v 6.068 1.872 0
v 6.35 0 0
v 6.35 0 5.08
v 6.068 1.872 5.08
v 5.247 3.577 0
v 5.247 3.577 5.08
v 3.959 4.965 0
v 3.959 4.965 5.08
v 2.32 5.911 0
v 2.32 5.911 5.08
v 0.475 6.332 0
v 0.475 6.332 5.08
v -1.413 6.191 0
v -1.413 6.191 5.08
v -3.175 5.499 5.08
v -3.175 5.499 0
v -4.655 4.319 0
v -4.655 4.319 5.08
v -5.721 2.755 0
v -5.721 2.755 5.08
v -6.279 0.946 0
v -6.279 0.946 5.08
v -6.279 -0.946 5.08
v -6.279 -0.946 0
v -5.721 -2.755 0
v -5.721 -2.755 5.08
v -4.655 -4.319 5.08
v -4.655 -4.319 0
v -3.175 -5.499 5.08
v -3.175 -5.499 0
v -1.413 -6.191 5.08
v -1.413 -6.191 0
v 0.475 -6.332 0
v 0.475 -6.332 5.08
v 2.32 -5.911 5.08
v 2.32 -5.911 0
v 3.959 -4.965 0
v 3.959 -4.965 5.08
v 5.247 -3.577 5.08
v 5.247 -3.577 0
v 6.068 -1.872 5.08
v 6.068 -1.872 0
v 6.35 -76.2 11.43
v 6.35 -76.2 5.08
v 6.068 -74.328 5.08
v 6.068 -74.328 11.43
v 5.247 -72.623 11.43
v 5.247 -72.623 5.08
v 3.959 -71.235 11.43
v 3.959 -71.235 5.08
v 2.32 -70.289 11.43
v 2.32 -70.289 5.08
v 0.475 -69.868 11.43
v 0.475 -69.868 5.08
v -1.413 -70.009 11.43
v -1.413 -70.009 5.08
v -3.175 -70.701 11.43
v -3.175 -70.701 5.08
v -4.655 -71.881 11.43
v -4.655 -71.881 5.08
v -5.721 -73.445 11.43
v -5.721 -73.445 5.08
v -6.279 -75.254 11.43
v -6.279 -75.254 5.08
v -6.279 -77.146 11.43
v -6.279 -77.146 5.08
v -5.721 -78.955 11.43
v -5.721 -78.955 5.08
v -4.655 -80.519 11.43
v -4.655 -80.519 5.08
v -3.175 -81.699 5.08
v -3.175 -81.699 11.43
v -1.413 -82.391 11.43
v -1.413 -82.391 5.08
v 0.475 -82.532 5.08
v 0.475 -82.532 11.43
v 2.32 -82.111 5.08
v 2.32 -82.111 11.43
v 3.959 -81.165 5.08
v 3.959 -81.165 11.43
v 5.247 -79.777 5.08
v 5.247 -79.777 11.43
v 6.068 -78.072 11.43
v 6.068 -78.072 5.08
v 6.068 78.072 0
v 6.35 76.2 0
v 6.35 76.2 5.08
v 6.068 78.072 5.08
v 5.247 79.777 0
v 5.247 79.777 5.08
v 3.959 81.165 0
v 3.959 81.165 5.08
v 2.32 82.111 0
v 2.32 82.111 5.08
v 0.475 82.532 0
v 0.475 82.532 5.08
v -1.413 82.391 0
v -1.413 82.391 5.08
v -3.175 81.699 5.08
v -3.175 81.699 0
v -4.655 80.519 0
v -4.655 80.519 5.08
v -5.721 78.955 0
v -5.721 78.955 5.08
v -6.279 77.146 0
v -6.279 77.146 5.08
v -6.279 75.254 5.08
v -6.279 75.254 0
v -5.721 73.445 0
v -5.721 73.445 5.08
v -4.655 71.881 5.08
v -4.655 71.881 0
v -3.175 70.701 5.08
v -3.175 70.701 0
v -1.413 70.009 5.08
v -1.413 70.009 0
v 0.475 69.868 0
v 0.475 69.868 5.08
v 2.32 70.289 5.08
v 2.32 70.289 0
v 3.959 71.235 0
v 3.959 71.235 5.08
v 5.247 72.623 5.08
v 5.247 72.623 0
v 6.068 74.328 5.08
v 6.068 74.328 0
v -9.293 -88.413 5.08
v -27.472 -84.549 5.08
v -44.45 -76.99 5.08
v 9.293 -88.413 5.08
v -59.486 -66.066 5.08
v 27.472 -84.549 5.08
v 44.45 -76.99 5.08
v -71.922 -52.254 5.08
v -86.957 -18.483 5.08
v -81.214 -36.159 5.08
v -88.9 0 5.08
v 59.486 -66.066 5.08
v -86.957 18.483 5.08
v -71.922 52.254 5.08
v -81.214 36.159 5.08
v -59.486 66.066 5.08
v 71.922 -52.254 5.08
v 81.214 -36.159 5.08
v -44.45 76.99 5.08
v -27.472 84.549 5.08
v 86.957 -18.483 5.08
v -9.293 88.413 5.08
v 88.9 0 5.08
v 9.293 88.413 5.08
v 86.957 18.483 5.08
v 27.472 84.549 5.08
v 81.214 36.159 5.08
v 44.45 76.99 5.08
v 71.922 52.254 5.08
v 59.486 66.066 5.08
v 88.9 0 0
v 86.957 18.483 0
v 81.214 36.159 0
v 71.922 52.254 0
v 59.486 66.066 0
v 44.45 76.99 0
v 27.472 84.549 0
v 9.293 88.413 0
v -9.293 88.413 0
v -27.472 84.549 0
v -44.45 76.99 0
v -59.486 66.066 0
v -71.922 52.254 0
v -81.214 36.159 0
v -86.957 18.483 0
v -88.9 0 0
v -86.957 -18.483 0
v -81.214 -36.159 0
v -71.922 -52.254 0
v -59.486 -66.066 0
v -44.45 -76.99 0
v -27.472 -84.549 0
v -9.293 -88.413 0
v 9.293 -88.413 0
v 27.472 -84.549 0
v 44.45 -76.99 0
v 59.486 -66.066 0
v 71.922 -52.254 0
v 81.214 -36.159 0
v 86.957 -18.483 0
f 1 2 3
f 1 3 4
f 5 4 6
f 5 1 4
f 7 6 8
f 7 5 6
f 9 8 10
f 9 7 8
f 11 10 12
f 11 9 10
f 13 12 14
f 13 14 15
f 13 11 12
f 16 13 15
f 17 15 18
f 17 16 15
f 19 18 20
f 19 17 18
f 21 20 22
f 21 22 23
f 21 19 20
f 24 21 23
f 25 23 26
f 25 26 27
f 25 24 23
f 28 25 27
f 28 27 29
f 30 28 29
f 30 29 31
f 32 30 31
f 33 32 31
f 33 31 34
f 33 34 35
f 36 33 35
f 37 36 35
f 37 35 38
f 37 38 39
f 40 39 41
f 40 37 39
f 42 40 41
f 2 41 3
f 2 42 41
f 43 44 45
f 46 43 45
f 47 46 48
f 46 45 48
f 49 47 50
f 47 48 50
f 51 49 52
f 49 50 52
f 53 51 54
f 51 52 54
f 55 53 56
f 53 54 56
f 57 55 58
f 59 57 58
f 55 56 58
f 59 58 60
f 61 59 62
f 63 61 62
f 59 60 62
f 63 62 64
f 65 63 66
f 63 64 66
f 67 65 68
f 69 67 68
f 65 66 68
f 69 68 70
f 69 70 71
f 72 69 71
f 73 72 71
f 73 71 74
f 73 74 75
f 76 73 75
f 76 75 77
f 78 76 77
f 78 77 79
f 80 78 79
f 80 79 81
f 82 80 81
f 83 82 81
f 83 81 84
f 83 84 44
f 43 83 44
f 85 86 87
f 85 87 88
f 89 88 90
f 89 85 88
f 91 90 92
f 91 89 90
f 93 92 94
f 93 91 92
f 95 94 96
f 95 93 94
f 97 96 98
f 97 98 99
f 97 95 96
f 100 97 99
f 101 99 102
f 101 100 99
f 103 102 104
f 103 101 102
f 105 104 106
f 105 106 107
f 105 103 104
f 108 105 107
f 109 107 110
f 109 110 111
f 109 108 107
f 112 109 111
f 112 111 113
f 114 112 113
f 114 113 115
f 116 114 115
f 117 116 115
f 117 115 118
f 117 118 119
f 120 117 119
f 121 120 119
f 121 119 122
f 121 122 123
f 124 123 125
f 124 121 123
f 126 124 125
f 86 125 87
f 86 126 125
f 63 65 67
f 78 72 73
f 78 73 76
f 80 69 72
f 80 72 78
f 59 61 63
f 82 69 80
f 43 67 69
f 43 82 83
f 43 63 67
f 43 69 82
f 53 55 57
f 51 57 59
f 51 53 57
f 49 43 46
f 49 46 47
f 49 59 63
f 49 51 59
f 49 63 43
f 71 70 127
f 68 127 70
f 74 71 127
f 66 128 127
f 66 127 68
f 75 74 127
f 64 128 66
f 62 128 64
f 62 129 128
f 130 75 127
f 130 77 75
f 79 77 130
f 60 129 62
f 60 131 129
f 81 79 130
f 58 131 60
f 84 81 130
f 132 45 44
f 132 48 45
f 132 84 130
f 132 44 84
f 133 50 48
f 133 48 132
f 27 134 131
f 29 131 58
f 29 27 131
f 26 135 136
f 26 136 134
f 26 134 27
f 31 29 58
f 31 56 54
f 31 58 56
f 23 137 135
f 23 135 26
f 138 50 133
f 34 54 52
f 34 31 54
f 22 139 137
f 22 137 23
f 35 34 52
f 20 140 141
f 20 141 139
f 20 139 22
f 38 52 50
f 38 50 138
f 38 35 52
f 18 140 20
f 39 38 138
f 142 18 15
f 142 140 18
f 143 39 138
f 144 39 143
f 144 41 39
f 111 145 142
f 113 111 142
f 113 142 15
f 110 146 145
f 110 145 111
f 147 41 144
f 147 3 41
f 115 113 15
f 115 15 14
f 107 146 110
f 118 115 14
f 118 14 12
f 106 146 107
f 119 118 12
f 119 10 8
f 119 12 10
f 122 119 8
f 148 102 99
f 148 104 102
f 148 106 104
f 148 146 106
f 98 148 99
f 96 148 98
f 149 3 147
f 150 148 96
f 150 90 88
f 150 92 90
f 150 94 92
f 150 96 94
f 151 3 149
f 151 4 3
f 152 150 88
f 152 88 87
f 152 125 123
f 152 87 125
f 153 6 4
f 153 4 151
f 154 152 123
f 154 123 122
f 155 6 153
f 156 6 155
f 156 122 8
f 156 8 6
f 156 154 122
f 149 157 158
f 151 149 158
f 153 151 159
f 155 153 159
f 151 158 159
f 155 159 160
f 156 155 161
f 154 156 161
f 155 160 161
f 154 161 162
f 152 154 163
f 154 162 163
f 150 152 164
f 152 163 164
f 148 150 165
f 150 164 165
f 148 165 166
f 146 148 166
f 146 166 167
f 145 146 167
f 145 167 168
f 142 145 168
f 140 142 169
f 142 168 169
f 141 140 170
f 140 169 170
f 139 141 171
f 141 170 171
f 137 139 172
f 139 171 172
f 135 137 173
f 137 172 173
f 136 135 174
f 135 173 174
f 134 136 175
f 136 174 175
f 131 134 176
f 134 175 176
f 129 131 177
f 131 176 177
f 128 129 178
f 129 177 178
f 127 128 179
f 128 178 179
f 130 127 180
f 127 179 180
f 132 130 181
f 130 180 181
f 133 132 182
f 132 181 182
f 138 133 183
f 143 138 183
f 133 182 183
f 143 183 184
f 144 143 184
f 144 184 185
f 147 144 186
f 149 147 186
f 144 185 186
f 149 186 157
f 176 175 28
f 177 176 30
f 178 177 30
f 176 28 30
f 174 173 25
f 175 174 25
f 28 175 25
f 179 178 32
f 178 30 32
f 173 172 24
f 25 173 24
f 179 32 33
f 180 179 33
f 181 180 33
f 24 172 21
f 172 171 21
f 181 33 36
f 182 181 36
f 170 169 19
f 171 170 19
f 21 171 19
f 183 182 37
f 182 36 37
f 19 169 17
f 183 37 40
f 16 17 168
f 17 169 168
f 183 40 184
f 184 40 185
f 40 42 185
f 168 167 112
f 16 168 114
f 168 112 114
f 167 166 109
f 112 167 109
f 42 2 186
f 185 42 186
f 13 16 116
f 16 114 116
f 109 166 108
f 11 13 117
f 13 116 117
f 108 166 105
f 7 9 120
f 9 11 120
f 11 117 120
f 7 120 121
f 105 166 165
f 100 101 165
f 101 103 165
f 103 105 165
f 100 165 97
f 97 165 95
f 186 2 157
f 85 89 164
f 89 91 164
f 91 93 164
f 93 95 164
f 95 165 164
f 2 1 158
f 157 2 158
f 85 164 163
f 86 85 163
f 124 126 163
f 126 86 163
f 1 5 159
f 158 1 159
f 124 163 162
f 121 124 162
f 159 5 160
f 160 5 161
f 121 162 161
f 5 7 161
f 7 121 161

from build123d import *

# Parameters (mm, degrees)
SKETCH1_R           = 88.9
SKETCH1_R_2         = 6.35
BOSS_EXTRUDE1_DEPTH = 5.08
SKETCH2_R           = 6.35
BOSS_EXTRUDE2_DEPTH = 11.43


with BuildPart() as part:
    # Sketch1 → Boss-Extrude1 (new body)
    with BuildSketch(Plane.XY):
        Circle(SKETCH1_R)
        Circle(SKETCH1_R_2, mode=Mode.SUBTRACT)
        with Locations((0, -76.2)):
            Circle(SKETCH1_R_2, mode=Mode.SUBTRACT)
        with Locations((0, 76.2)):
            Circle(SKETCH1_R_2, mode=Mode.SUBTRACT)
    extrude(amount=BOSS_EXTRUDE1_DEPTH)

    # Sketch2 → Boss-Extrude2 (add)
    with BuildSketch(Plane.XY):
        with Locations((0, -76.2)):
            Circle(SKETCH2_R)
    extrude(amount=BOSS_EXTRUDE2_DEPTH)


solid = part.part
